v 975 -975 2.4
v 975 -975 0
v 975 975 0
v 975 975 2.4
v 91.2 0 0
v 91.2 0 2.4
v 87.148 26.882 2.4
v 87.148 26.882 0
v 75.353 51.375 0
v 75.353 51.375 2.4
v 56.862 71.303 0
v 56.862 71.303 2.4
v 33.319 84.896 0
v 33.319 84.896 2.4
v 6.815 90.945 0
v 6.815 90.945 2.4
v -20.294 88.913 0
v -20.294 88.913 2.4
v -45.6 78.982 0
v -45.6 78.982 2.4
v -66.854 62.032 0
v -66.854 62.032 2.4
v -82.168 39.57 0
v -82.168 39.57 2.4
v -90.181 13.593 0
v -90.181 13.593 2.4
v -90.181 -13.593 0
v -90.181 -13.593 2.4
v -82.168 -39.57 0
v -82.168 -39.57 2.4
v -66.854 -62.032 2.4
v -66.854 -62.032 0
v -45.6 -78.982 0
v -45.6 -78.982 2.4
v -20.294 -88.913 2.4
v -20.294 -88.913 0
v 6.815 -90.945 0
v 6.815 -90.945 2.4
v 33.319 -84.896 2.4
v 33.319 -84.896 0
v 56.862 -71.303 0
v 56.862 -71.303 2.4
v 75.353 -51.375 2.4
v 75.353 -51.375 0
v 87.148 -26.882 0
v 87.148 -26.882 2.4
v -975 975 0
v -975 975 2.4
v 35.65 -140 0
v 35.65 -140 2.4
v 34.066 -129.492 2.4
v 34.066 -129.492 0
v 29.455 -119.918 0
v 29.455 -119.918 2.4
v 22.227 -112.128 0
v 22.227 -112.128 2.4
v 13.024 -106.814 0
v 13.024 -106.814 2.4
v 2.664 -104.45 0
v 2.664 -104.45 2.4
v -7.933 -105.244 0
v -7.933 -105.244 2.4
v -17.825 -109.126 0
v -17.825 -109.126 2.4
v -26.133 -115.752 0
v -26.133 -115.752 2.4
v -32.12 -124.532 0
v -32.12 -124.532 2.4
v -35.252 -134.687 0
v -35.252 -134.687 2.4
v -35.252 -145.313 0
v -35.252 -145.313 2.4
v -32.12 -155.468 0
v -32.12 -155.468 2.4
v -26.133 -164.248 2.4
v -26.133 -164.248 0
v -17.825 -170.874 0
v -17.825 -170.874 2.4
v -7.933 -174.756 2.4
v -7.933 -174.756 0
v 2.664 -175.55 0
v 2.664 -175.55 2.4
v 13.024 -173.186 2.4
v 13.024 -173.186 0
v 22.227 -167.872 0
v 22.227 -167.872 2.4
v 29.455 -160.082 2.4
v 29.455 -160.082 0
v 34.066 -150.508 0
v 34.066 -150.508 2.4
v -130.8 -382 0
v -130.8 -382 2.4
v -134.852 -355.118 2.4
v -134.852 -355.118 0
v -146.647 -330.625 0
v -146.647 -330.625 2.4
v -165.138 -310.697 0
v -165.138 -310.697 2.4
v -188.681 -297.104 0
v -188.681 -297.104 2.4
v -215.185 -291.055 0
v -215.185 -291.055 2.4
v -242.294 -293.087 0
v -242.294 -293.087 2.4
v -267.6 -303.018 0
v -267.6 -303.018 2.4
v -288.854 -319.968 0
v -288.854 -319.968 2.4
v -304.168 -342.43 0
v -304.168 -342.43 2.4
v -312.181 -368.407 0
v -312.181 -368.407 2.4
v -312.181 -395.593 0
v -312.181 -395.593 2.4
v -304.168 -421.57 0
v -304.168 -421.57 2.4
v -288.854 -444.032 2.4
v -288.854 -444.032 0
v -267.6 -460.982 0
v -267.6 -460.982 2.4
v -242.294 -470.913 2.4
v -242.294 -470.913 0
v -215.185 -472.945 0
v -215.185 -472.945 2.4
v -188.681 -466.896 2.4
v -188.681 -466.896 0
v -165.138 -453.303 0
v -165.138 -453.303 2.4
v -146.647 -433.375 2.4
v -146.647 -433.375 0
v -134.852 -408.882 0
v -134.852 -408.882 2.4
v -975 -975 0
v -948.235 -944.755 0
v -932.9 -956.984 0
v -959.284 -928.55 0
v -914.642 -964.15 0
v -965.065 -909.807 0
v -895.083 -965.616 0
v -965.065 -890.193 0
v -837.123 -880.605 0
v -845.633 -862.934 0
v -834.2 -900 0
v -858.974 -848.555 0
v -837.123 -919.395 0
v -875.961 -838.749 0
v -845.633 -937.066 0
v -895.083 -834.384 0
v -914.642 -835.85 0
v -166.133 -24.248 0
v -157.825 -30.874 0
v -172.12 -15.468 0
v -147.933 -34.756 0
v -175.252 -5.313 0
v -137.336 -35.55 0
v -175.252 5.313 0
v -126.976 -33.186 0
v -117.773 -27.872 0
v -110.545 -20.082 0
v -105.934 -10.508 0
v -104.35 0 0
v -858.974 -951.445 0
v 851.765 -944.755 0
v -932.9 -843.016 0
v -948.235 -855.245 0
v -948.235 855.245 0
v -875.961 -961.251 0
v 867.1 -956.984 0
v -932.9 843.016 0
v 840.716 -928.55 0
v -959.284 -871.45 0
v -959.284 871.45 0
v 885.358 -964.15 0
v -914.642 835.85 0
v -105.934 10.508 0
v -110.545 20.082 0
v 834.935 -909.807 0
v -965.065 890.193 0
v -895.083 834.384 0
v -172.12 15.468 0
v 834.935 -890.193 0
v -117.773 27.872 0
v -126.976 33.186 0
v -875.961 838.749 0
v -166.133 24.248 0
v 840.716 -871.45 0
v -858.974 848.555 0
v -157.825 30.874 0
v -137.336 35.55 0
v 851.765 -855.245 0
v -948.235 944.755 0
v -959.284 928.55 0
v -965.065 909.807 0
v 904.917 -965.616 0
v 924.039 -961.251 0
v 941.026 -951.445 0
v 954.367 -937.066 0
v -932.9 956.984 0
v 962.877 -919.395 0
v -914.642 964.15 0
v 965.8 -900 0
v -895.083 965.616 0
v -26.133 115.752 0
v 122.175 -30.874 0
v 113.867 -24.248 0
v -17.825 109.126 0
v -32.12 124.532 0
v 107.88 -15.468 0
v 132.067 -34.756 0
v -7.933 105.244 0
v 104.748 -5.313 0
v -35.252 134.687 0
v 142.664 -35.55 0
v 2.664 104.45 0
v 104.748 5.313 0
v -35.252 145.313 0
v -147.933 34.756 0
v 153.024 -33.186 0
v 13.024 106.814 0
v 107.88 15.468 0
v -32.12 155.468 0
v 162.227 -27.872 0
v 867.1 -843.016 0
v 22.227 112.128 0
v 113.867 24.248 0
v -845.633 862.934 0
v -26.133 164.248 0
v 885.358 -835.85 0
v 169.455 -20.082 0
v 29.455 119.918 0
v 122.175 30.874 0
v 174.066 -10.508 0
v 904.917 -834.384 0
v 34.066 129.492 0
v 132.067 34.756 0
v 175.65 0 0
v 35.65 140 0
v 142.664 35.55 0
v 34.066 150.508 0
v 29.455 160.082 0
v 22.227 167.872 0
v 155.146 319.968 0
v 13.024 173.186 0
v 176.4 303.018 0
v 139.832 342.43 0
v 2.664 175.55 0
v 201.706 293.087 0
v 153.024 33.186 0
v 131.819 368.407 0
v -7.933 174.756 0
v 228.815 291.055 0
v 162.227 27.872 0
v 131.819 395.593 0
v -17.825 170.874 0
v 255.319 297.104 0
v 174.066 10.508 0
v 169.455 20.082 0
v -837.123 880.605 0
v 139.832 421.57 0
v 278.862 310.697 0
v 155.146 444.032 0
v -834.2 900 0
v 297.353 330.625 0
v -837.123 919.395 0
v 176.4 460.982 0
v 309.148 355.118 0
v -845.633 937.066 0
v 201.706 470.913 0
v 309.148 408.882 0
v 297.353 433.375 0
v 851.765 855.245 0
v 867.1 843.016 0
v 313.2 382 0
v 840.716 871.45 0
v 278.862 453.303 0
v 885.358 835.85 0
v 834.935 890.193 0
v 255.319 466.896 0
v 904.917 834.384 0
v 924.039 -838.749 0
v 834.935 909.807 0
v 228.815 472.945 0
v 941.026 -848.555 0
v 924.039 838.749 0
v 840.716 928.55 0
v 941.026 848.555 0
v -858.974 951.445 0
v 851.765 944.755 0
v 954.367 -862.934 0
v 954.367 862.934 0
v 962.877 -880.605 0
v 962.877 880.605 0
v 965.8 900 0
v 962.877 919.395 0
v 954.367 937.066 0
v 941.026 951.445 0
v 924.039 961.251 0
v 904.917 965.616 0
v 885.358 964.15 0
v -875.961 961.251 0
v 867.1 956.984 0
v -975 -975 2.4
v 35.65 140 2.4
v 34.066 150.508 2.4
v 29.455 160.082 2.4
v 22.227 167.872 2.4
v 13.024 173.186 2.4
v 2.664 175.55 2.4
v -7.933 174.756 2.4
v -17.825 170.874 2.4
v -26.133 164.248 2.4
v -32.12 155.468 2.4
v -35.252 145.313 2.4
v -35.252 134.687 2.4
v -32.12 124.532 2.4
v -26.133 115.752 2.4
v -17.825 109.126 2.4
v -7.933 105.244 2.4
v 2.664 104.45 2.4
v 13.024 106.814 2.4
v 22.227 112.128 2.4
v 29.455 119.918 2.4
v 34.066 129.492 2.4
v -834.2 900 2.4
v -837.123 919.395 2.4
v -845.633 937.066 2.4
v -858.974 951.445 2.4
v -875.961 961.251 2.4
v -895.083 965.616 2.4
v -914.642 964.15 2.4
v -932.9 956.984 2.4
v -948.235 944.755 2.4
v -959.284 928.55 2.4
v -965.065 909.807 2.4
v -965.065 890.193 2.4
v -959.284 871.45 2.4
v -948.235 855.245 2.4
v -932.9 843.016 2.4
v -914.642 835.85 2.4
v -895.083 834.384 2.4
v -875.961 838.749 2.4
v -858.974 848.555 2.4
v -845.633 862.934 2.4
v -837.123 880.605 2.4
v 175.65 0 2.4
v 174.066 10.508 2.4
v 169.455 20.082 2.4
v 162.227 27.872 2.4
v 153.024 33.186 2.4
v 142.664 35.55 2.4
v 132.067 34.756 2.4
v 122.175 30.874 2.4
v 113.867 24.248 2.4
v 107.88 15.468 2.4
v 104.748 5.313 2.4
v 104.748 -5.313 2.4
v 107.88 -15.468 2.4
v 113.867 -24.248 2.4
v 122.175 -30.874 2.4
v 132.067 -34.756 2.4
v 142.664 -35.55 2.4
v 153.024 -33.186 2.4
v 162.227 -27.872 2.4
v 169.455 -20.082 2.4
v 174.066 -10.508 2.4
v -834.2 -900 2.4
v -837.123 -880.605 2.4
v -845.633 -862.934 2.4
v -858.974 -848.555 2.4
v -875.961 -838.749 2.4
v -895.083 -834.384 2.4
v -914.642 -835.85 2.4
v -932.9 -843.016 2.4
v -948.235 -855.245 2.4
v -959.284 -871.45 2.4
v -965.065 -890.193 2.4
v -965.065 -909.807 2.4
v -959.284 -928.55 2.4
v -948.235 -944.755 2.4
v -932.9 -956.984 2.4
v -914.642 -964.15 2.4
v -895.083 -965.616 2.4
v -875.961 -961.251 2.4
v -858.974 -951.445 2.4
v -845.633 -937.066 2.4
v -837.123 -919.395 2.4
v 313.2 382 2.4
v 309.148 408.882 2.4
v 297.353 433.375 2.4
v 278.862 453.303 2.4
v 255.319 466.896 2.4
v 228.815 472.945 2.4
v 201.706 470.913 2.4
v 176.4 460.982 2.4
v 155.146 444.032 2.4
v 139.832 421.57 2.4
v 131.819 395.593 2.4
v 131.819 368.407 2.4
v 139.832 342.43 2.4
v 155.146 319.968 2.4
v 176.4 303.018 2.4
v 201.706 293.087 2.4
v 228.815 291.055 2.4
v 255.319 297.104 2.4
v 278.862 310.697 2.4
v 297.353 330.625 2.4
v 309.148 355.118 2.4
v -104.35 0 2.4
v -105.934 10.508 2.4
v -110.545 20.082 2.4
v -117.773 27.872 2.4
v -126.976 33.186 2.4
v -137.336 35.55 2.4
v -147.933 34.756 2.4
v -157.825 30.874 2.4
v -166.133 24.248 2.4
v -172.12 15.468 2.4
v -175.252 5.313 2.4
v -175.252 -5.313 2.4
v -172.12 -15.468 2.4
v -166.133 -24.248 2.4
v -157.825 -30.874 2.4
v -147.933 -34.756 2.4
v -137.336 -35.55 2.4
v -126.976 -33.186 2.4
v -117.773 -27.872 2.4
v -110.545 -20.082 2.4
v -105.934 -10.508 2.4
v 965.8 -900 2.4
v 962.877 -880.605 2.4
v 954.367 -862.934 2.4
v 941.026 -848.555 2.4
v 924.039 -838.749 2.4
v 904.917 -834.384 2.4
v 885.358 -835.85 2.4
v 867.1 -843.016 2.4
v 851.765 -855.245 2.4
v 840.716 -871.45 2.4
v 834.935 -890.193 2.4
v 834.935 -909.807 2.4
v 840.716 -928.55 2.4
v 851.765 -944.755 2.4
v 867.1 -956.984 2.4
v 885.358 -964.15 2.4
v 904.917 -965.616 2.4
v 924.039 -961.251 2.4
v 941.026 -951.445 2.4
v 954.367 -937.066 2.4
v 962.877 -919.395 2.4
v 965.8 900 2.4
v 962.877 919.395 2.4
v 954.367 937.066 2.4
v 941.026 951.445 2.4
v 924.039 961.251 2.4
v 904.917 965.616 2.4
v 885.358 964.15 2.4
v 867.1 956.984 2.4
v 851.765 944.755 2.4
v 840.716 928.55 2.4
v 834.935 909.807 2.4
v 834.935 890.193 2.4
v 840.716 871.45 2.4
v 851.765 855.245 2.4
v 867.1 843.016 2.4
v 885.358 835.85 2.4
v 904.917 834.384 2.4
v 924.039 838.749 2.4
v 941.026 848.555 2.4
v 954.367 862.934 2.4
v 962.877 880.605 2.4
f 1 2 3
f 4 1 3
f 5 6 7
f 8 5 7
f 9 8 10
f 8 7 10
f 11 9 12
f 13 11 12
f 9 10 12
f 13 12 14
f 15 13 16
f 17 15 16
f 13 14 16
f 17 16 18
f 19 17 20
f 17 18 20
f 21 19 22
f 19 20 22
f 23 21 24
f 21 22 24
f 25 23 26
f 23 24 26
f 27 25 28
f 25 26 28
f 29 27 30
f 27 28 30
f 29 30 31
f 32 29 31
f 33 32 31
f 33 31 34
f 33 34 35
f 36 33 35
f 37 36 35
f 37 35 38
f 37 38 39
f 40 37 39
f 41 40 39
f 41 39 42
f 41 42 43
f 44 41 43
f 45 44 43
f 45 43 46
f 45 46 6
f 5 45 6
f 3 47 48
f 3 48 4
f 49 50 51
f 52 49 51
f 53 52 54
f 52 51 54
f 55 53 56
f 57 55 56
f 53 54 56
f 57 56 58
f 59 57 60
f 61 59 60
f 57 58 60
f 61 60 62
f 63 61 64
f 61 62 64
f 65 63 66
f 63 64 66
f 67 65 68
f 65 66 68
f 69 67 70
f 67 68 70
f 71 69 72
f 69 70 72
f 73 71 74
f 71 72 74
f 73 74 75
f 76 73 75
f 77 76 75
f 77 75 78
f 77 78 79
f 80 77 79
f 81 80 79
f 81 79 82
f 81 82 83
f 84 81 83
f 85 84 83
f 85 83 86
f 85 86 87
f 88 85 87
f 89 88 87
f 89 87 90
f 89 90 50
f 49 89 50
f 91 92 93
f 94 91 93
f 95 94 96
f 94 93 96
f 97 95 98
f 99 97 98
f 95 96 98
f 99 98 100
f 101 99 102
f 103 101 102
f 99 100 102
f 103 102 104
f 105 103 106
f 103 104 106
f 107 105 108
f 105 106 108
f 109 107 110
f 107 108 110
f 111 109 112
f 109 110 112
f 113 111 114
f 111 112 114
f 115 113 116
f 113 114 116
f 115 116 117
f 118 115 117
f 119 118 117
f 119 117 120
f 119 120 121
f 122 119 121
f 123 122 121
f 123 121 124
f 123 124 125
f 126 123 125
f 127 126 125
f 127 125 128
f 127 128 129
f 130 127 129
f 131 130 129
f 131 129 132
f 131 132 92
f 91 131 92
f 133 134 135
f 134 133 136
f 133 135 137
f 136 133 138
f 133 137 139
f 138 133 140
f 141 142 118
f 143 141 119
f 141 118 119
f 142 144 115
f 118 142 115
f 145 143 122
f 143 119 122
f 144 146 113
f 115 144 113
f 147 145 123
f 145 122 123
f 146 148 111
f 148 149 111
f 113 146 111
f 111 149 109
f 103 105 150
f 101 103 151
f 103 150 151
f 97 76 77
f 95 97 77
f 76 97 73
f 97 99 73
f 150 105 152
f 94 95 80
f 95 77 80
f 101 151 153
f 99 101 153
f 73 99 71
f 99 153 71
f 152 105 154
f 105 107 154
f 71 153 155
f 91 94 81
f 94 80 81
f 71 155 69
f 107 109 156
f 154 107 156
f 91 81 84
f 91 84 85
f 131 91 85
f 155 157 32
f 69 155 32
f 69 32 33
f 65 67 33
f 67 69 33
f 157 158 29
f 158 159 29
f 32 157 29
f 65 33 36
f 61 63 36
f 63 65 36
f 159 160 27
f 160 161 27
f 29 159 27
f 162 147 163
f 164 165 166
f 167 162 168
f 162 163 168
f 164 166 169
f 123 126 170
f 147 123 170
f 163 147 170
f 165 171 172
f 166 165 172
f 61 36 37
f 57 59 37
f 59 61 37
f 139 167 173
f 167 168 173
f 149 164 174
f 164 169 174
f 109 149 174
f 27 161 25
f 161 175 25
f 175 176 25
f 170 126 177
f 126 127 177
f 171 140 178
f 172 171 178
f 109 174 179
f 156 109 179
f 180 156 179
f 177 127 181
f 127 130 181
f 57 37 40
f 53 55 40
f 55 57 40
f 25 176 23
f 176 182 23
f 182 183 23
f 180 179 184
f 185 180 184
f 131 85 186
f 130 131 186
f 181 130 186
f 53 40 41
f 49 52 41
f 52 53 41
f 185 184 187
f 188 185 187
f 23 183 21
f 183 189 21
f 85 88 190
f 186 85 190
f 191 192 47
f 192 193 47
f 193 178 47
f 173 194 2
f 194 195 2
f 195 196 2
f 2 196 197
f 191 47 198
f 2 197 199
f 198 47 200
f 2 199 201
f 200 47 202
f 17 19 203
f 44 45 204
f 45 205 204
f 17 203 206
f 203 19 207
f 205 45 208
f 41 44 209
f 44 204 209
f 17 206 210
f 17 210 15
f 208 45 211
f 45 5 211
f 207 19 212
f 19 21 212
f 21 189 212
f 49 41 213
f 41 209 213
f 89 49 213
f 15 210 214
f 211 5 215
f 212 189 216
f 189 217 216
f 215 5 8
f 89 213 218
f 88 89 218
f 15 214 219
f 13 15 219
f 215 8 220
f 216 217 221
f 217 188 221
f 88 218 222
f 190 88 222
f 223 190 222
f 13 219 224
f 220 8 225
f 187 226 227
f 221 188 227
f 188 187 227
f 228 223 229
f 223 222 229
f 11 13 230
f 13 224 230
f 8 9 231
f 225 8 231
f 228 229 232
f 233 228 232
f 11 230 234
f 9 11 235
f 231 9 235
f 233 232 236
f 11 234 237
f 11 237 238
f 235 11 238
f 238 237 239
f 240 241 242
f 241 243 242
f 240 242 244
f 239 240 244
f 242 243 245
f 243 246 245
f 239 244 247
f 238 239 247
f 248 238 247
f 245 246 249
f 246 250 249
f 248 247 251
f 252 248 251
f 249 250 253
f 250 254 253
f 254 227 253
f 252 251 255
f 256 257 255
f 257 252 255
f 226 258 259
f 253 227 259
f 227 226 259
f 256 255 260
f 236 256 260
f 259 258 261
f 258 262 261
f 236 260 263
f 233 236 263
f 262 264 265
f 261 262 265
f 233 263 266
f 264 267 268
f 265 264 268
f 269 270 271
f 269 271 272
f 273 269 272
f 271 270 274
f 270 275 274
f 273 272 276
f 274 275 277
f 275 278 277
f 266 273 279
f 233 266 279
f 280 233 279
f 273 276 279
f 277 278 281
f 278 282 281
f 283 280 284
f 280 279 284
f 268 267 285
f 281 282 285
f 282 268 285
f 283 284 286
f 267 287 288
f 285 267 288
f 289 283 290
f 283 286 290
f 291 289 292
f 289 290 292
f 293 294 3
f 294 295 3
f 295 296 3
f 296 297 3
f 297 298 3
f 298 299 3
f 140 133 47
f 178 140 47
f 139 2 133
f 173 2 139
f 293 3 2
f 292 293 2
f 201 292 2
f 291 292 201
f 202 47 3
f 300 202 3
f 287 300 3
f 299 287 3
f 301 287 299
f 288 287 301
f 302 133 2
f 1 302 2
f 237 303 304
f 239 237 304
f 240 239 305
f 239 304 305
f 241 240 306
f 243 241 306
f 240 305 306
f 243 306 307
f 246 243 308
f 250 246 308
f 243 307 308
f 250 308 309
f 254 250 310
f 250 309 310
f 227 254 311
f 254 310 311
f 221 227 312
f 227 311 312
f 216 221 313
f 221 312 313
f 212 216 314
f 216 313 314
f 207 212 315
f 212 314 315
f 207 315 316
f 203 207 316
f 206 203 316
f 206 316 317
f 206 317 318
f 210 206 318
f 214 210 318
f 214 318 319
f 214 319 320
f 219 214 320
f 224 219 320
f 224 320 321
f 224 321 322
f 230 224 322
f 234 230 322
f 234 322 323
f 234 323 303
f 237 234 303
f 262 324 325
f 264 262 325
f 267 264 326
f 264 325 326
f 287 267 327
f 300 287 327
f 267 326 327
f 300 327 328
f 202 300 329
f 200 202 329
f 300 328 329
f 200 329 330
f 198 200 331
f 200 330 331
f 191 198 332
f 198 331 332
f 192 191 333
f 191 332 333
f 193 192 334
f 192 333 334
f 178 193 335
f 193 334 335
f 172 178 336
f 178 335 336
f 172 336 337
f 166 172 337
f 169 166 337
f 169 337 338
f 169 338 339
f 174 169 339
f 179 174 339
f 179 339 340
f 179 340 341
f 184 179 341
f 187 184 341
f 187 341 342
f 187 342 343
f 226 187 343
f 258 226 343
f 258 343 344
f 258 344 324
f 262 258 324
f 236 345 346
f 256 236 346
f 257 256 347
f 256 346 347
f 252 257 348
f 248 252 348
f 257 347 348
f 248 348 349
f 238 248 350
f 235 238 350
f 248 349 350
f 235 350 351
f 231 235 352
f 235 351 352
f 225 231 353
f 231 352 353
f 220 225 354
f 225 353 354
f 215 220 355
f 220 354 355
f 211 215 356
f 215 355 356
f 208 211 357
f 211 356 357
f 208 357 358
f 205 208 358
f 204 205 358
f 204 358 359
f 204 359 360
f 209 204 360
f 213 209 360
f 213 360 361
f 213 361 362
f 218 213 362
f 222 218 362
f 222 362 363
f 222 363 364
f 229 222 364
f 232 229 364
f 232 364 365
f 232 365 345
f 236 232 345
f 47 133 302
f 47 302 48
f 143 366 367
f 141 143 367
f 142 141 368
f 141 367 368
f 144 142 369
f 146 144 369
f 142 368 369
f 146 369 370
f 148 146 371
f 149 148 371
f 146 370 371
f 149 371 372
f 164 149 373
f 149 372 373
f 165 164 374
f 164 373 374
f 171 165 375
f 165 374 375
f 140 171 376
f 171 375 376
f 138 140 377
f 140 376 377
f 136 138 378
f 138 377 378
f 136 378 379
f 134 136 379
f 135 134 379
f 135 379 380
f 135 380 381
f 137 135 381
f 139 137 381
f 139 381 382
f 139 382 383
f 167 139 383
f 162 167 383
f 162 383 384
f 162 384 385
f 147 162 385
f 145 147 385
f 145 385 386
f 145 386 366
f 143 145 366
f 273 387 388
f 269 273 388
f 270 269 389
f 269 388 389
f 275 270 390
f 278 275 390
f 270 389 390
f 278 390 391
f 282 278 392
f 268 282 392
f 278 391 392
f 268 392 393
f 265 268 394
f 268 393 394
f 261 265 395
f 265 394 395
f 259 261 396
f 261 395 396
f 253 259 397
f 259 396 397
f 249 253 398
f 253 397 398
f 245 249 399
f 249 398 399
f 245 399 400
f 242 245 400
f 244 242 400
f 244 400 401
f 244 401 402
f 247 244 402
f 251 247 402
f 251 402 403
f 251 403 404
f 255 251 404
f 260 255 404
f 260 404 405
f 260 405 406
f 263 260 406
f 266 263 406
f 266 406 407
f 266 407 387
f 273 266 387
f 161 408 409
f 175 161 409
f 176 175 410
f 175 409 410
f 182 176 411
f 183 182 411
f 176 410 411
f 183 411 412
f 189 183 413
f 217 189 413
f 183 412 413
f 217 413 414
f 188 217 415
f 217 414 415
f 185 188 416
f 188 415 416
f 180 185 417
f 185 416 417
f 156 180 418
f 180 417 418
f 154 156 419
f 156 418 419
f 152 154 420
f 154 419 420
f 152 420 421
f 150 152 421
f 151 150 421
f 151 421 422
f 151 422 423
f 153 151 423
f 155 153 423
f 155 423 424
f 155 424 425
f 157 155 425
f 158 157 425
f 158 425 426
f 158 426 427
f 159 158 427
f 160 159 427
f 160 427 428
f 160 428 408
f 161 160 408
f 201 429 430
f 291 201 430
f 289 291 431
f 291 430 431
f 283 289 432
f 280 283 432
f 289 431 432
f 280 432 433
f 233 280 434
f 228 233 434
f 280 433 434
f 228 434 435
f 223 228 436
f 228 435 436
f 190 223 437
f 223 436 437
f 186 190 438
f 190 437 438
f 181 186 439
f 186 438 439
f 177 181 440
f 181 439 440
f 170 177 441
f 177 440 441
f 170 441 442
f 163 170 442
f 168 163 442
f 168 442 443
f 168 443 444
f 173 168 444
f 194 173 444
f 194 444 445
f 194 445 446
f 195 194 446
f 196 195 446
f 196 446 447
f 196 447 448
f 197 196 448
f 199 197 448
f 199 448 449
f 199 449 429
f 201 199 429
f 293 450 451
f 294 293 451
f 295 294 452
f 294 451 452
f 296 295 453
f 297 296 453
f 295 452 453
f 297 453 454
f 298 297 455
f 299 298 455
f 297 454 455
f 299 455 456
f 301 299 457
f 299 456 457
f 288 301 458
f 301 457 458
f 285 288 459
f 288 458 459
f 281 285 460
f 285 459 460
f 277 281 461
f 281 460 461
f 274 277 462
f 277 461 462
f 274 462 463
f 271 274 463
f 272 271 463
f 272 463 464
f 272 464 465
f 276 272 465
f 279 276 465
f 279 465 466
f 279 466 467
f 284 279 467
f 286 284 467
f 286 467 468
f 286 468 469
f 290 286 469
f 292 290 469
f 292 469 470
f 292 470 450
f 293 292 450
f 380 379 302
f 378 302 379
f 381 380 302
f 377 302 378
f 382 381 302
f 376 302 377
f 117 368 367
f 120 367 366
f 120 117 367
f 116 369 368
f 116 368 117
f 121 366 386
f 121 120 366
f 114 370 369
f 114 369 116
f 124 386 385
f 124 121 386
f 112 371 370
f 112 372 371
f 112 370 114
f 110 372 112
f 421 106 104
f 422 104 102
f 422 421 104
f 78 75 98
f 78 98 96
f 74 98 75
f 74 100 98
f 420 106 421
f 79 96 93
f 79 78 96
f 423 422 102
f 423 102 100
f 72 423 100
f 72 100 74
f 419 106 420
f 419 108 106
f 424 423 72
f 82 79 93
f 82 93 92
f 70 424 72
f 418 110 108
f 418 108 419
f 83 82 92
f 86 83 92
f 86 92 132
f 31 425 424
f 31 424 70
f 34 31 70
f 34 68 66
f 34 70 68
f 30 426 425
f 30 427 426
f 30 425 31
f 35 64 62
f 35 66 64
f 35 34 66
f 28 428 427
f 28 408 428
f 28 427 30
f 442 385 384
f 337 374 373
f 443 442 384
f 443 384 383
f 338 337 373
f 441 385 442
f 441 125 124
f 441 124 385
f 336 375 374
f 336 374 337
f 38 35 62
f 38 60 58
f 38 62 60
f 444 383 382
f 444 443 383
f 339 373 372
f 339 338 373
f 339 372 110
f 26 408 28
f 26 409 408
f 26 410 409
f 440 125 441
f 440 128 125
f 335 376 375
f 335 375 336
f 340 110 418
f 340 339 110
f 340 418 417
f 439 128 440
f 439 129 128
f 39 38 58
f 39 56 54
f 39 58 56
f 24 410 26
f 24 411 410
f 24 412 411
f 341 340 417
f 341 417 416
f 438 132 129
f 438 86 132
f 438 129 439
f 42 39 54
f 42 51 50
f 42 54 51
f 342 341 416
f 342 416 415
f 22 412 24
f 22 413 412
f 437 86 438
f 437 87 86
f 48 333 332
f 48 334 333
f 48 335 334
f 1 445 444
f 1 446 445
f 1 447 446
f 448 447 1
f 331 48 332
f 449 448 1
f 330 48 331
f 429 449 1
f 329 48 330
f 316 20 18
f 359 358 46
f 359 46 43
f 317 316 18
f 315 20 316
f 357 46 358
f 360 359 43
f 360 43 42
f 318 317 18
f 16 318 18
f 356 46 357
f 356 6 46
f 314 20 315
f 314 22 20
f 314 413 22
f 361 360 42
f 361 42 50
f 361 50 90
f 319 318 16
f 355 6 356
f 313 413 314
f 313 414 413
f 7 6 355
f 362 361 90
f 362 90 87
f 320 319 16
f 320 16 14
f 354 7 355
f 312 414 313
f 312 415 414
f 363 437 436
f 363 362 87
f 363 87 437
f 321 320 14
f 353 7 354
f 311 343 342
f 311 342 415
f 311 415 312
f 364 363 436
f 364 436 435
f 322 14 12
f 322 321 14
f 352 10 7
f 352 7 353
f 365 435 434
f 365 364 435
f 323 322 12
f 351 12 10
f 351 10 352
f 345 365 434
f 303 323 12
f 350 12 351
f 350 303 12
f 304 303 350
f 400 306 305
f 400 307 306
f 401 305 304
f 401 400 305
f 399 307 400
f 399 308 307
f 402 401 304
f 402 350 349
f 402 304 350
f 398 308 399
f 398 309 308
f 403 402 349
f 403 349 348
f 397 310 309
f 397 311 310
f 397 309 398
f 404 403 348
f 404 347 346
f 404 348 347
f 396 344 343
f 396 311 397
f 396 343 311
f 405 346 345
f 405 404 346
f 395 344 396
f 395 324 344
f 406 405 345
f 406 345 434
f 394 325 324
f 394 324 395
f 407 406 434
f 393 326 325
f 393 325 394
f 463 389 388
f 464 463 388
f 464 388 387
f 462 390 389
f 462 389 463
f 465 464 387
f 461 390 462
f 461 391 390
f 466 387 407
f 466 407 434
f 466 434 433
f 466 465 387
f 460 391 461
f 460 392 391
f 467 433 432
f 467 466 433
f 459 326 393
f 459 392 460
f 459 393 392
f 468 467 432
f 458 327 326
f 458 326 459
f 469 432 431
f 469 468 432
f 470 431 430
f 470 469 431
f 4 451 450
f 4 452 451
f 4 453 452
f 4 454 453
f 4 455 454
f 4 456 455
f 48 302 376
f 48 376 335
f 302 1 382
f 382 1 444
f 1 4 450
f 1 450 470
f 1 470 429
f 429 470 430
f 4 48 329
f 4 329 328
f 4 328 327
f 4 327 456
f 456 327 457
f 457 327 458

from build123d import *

# Parameters (mm, degrees)
SKETCH1_W           = 1950
SKETCH1_H           = 1950
BOSS_EXTRUDE1_DEPTH = 2.4
SKETCH2_R           = 91.2
SKETCH2_R_2         = 35.65
SKETCH2_R_3         = 65.8
CUT_EXTRUDE1_DEPTH  = 3.4


with BuildPart() as part:
    # Sketch1 → Boss-Extrude1 (new body)
    with BuildSketch(Plane.XY):
        Rectangle(SKETCH1_W, SKETCH1_H)
    extrude(amount=BOSS_EXTRUDE1_DEPTH)

    # Sketch2 → Cut-Extrude1 (cut, through all)
    with BuildSketch(Plane.XY.offset(2.4)):
        Circle(SKETCH2_R)
        with Locations((0, 140)):
            Circle(SKETCH2_R_2)
        with Locations((222, 382)):
            Circle(SKETCH2_R)
        with Locations((-222, -382)):
            Circle(SKETCH2_R)
        with Locations((-900, 900)):
            Circle(SKETCH2_R_3)
        with Locations((-900, -900)):
            Circle(SKETCH2_R_3)
        with Locations((0, -140)):
            Circle(SKETCH2_R_2)
        with Locations((900, 900)):
            Circle(SKETCH2_R_3)
        with Locations((140, 0)):
            Circle(SKETCH2_R_2)
        with Locations((-140, 0)):
            Circle(SKETCH2_R_2)
        with Locations((900, -900)):
            Circle(SKETCH2_R_3)
    extrude(amount=-CUT_EXTRUDE1_DEPTH, mode=Mode.SUBTRACT)


solid = part.part
